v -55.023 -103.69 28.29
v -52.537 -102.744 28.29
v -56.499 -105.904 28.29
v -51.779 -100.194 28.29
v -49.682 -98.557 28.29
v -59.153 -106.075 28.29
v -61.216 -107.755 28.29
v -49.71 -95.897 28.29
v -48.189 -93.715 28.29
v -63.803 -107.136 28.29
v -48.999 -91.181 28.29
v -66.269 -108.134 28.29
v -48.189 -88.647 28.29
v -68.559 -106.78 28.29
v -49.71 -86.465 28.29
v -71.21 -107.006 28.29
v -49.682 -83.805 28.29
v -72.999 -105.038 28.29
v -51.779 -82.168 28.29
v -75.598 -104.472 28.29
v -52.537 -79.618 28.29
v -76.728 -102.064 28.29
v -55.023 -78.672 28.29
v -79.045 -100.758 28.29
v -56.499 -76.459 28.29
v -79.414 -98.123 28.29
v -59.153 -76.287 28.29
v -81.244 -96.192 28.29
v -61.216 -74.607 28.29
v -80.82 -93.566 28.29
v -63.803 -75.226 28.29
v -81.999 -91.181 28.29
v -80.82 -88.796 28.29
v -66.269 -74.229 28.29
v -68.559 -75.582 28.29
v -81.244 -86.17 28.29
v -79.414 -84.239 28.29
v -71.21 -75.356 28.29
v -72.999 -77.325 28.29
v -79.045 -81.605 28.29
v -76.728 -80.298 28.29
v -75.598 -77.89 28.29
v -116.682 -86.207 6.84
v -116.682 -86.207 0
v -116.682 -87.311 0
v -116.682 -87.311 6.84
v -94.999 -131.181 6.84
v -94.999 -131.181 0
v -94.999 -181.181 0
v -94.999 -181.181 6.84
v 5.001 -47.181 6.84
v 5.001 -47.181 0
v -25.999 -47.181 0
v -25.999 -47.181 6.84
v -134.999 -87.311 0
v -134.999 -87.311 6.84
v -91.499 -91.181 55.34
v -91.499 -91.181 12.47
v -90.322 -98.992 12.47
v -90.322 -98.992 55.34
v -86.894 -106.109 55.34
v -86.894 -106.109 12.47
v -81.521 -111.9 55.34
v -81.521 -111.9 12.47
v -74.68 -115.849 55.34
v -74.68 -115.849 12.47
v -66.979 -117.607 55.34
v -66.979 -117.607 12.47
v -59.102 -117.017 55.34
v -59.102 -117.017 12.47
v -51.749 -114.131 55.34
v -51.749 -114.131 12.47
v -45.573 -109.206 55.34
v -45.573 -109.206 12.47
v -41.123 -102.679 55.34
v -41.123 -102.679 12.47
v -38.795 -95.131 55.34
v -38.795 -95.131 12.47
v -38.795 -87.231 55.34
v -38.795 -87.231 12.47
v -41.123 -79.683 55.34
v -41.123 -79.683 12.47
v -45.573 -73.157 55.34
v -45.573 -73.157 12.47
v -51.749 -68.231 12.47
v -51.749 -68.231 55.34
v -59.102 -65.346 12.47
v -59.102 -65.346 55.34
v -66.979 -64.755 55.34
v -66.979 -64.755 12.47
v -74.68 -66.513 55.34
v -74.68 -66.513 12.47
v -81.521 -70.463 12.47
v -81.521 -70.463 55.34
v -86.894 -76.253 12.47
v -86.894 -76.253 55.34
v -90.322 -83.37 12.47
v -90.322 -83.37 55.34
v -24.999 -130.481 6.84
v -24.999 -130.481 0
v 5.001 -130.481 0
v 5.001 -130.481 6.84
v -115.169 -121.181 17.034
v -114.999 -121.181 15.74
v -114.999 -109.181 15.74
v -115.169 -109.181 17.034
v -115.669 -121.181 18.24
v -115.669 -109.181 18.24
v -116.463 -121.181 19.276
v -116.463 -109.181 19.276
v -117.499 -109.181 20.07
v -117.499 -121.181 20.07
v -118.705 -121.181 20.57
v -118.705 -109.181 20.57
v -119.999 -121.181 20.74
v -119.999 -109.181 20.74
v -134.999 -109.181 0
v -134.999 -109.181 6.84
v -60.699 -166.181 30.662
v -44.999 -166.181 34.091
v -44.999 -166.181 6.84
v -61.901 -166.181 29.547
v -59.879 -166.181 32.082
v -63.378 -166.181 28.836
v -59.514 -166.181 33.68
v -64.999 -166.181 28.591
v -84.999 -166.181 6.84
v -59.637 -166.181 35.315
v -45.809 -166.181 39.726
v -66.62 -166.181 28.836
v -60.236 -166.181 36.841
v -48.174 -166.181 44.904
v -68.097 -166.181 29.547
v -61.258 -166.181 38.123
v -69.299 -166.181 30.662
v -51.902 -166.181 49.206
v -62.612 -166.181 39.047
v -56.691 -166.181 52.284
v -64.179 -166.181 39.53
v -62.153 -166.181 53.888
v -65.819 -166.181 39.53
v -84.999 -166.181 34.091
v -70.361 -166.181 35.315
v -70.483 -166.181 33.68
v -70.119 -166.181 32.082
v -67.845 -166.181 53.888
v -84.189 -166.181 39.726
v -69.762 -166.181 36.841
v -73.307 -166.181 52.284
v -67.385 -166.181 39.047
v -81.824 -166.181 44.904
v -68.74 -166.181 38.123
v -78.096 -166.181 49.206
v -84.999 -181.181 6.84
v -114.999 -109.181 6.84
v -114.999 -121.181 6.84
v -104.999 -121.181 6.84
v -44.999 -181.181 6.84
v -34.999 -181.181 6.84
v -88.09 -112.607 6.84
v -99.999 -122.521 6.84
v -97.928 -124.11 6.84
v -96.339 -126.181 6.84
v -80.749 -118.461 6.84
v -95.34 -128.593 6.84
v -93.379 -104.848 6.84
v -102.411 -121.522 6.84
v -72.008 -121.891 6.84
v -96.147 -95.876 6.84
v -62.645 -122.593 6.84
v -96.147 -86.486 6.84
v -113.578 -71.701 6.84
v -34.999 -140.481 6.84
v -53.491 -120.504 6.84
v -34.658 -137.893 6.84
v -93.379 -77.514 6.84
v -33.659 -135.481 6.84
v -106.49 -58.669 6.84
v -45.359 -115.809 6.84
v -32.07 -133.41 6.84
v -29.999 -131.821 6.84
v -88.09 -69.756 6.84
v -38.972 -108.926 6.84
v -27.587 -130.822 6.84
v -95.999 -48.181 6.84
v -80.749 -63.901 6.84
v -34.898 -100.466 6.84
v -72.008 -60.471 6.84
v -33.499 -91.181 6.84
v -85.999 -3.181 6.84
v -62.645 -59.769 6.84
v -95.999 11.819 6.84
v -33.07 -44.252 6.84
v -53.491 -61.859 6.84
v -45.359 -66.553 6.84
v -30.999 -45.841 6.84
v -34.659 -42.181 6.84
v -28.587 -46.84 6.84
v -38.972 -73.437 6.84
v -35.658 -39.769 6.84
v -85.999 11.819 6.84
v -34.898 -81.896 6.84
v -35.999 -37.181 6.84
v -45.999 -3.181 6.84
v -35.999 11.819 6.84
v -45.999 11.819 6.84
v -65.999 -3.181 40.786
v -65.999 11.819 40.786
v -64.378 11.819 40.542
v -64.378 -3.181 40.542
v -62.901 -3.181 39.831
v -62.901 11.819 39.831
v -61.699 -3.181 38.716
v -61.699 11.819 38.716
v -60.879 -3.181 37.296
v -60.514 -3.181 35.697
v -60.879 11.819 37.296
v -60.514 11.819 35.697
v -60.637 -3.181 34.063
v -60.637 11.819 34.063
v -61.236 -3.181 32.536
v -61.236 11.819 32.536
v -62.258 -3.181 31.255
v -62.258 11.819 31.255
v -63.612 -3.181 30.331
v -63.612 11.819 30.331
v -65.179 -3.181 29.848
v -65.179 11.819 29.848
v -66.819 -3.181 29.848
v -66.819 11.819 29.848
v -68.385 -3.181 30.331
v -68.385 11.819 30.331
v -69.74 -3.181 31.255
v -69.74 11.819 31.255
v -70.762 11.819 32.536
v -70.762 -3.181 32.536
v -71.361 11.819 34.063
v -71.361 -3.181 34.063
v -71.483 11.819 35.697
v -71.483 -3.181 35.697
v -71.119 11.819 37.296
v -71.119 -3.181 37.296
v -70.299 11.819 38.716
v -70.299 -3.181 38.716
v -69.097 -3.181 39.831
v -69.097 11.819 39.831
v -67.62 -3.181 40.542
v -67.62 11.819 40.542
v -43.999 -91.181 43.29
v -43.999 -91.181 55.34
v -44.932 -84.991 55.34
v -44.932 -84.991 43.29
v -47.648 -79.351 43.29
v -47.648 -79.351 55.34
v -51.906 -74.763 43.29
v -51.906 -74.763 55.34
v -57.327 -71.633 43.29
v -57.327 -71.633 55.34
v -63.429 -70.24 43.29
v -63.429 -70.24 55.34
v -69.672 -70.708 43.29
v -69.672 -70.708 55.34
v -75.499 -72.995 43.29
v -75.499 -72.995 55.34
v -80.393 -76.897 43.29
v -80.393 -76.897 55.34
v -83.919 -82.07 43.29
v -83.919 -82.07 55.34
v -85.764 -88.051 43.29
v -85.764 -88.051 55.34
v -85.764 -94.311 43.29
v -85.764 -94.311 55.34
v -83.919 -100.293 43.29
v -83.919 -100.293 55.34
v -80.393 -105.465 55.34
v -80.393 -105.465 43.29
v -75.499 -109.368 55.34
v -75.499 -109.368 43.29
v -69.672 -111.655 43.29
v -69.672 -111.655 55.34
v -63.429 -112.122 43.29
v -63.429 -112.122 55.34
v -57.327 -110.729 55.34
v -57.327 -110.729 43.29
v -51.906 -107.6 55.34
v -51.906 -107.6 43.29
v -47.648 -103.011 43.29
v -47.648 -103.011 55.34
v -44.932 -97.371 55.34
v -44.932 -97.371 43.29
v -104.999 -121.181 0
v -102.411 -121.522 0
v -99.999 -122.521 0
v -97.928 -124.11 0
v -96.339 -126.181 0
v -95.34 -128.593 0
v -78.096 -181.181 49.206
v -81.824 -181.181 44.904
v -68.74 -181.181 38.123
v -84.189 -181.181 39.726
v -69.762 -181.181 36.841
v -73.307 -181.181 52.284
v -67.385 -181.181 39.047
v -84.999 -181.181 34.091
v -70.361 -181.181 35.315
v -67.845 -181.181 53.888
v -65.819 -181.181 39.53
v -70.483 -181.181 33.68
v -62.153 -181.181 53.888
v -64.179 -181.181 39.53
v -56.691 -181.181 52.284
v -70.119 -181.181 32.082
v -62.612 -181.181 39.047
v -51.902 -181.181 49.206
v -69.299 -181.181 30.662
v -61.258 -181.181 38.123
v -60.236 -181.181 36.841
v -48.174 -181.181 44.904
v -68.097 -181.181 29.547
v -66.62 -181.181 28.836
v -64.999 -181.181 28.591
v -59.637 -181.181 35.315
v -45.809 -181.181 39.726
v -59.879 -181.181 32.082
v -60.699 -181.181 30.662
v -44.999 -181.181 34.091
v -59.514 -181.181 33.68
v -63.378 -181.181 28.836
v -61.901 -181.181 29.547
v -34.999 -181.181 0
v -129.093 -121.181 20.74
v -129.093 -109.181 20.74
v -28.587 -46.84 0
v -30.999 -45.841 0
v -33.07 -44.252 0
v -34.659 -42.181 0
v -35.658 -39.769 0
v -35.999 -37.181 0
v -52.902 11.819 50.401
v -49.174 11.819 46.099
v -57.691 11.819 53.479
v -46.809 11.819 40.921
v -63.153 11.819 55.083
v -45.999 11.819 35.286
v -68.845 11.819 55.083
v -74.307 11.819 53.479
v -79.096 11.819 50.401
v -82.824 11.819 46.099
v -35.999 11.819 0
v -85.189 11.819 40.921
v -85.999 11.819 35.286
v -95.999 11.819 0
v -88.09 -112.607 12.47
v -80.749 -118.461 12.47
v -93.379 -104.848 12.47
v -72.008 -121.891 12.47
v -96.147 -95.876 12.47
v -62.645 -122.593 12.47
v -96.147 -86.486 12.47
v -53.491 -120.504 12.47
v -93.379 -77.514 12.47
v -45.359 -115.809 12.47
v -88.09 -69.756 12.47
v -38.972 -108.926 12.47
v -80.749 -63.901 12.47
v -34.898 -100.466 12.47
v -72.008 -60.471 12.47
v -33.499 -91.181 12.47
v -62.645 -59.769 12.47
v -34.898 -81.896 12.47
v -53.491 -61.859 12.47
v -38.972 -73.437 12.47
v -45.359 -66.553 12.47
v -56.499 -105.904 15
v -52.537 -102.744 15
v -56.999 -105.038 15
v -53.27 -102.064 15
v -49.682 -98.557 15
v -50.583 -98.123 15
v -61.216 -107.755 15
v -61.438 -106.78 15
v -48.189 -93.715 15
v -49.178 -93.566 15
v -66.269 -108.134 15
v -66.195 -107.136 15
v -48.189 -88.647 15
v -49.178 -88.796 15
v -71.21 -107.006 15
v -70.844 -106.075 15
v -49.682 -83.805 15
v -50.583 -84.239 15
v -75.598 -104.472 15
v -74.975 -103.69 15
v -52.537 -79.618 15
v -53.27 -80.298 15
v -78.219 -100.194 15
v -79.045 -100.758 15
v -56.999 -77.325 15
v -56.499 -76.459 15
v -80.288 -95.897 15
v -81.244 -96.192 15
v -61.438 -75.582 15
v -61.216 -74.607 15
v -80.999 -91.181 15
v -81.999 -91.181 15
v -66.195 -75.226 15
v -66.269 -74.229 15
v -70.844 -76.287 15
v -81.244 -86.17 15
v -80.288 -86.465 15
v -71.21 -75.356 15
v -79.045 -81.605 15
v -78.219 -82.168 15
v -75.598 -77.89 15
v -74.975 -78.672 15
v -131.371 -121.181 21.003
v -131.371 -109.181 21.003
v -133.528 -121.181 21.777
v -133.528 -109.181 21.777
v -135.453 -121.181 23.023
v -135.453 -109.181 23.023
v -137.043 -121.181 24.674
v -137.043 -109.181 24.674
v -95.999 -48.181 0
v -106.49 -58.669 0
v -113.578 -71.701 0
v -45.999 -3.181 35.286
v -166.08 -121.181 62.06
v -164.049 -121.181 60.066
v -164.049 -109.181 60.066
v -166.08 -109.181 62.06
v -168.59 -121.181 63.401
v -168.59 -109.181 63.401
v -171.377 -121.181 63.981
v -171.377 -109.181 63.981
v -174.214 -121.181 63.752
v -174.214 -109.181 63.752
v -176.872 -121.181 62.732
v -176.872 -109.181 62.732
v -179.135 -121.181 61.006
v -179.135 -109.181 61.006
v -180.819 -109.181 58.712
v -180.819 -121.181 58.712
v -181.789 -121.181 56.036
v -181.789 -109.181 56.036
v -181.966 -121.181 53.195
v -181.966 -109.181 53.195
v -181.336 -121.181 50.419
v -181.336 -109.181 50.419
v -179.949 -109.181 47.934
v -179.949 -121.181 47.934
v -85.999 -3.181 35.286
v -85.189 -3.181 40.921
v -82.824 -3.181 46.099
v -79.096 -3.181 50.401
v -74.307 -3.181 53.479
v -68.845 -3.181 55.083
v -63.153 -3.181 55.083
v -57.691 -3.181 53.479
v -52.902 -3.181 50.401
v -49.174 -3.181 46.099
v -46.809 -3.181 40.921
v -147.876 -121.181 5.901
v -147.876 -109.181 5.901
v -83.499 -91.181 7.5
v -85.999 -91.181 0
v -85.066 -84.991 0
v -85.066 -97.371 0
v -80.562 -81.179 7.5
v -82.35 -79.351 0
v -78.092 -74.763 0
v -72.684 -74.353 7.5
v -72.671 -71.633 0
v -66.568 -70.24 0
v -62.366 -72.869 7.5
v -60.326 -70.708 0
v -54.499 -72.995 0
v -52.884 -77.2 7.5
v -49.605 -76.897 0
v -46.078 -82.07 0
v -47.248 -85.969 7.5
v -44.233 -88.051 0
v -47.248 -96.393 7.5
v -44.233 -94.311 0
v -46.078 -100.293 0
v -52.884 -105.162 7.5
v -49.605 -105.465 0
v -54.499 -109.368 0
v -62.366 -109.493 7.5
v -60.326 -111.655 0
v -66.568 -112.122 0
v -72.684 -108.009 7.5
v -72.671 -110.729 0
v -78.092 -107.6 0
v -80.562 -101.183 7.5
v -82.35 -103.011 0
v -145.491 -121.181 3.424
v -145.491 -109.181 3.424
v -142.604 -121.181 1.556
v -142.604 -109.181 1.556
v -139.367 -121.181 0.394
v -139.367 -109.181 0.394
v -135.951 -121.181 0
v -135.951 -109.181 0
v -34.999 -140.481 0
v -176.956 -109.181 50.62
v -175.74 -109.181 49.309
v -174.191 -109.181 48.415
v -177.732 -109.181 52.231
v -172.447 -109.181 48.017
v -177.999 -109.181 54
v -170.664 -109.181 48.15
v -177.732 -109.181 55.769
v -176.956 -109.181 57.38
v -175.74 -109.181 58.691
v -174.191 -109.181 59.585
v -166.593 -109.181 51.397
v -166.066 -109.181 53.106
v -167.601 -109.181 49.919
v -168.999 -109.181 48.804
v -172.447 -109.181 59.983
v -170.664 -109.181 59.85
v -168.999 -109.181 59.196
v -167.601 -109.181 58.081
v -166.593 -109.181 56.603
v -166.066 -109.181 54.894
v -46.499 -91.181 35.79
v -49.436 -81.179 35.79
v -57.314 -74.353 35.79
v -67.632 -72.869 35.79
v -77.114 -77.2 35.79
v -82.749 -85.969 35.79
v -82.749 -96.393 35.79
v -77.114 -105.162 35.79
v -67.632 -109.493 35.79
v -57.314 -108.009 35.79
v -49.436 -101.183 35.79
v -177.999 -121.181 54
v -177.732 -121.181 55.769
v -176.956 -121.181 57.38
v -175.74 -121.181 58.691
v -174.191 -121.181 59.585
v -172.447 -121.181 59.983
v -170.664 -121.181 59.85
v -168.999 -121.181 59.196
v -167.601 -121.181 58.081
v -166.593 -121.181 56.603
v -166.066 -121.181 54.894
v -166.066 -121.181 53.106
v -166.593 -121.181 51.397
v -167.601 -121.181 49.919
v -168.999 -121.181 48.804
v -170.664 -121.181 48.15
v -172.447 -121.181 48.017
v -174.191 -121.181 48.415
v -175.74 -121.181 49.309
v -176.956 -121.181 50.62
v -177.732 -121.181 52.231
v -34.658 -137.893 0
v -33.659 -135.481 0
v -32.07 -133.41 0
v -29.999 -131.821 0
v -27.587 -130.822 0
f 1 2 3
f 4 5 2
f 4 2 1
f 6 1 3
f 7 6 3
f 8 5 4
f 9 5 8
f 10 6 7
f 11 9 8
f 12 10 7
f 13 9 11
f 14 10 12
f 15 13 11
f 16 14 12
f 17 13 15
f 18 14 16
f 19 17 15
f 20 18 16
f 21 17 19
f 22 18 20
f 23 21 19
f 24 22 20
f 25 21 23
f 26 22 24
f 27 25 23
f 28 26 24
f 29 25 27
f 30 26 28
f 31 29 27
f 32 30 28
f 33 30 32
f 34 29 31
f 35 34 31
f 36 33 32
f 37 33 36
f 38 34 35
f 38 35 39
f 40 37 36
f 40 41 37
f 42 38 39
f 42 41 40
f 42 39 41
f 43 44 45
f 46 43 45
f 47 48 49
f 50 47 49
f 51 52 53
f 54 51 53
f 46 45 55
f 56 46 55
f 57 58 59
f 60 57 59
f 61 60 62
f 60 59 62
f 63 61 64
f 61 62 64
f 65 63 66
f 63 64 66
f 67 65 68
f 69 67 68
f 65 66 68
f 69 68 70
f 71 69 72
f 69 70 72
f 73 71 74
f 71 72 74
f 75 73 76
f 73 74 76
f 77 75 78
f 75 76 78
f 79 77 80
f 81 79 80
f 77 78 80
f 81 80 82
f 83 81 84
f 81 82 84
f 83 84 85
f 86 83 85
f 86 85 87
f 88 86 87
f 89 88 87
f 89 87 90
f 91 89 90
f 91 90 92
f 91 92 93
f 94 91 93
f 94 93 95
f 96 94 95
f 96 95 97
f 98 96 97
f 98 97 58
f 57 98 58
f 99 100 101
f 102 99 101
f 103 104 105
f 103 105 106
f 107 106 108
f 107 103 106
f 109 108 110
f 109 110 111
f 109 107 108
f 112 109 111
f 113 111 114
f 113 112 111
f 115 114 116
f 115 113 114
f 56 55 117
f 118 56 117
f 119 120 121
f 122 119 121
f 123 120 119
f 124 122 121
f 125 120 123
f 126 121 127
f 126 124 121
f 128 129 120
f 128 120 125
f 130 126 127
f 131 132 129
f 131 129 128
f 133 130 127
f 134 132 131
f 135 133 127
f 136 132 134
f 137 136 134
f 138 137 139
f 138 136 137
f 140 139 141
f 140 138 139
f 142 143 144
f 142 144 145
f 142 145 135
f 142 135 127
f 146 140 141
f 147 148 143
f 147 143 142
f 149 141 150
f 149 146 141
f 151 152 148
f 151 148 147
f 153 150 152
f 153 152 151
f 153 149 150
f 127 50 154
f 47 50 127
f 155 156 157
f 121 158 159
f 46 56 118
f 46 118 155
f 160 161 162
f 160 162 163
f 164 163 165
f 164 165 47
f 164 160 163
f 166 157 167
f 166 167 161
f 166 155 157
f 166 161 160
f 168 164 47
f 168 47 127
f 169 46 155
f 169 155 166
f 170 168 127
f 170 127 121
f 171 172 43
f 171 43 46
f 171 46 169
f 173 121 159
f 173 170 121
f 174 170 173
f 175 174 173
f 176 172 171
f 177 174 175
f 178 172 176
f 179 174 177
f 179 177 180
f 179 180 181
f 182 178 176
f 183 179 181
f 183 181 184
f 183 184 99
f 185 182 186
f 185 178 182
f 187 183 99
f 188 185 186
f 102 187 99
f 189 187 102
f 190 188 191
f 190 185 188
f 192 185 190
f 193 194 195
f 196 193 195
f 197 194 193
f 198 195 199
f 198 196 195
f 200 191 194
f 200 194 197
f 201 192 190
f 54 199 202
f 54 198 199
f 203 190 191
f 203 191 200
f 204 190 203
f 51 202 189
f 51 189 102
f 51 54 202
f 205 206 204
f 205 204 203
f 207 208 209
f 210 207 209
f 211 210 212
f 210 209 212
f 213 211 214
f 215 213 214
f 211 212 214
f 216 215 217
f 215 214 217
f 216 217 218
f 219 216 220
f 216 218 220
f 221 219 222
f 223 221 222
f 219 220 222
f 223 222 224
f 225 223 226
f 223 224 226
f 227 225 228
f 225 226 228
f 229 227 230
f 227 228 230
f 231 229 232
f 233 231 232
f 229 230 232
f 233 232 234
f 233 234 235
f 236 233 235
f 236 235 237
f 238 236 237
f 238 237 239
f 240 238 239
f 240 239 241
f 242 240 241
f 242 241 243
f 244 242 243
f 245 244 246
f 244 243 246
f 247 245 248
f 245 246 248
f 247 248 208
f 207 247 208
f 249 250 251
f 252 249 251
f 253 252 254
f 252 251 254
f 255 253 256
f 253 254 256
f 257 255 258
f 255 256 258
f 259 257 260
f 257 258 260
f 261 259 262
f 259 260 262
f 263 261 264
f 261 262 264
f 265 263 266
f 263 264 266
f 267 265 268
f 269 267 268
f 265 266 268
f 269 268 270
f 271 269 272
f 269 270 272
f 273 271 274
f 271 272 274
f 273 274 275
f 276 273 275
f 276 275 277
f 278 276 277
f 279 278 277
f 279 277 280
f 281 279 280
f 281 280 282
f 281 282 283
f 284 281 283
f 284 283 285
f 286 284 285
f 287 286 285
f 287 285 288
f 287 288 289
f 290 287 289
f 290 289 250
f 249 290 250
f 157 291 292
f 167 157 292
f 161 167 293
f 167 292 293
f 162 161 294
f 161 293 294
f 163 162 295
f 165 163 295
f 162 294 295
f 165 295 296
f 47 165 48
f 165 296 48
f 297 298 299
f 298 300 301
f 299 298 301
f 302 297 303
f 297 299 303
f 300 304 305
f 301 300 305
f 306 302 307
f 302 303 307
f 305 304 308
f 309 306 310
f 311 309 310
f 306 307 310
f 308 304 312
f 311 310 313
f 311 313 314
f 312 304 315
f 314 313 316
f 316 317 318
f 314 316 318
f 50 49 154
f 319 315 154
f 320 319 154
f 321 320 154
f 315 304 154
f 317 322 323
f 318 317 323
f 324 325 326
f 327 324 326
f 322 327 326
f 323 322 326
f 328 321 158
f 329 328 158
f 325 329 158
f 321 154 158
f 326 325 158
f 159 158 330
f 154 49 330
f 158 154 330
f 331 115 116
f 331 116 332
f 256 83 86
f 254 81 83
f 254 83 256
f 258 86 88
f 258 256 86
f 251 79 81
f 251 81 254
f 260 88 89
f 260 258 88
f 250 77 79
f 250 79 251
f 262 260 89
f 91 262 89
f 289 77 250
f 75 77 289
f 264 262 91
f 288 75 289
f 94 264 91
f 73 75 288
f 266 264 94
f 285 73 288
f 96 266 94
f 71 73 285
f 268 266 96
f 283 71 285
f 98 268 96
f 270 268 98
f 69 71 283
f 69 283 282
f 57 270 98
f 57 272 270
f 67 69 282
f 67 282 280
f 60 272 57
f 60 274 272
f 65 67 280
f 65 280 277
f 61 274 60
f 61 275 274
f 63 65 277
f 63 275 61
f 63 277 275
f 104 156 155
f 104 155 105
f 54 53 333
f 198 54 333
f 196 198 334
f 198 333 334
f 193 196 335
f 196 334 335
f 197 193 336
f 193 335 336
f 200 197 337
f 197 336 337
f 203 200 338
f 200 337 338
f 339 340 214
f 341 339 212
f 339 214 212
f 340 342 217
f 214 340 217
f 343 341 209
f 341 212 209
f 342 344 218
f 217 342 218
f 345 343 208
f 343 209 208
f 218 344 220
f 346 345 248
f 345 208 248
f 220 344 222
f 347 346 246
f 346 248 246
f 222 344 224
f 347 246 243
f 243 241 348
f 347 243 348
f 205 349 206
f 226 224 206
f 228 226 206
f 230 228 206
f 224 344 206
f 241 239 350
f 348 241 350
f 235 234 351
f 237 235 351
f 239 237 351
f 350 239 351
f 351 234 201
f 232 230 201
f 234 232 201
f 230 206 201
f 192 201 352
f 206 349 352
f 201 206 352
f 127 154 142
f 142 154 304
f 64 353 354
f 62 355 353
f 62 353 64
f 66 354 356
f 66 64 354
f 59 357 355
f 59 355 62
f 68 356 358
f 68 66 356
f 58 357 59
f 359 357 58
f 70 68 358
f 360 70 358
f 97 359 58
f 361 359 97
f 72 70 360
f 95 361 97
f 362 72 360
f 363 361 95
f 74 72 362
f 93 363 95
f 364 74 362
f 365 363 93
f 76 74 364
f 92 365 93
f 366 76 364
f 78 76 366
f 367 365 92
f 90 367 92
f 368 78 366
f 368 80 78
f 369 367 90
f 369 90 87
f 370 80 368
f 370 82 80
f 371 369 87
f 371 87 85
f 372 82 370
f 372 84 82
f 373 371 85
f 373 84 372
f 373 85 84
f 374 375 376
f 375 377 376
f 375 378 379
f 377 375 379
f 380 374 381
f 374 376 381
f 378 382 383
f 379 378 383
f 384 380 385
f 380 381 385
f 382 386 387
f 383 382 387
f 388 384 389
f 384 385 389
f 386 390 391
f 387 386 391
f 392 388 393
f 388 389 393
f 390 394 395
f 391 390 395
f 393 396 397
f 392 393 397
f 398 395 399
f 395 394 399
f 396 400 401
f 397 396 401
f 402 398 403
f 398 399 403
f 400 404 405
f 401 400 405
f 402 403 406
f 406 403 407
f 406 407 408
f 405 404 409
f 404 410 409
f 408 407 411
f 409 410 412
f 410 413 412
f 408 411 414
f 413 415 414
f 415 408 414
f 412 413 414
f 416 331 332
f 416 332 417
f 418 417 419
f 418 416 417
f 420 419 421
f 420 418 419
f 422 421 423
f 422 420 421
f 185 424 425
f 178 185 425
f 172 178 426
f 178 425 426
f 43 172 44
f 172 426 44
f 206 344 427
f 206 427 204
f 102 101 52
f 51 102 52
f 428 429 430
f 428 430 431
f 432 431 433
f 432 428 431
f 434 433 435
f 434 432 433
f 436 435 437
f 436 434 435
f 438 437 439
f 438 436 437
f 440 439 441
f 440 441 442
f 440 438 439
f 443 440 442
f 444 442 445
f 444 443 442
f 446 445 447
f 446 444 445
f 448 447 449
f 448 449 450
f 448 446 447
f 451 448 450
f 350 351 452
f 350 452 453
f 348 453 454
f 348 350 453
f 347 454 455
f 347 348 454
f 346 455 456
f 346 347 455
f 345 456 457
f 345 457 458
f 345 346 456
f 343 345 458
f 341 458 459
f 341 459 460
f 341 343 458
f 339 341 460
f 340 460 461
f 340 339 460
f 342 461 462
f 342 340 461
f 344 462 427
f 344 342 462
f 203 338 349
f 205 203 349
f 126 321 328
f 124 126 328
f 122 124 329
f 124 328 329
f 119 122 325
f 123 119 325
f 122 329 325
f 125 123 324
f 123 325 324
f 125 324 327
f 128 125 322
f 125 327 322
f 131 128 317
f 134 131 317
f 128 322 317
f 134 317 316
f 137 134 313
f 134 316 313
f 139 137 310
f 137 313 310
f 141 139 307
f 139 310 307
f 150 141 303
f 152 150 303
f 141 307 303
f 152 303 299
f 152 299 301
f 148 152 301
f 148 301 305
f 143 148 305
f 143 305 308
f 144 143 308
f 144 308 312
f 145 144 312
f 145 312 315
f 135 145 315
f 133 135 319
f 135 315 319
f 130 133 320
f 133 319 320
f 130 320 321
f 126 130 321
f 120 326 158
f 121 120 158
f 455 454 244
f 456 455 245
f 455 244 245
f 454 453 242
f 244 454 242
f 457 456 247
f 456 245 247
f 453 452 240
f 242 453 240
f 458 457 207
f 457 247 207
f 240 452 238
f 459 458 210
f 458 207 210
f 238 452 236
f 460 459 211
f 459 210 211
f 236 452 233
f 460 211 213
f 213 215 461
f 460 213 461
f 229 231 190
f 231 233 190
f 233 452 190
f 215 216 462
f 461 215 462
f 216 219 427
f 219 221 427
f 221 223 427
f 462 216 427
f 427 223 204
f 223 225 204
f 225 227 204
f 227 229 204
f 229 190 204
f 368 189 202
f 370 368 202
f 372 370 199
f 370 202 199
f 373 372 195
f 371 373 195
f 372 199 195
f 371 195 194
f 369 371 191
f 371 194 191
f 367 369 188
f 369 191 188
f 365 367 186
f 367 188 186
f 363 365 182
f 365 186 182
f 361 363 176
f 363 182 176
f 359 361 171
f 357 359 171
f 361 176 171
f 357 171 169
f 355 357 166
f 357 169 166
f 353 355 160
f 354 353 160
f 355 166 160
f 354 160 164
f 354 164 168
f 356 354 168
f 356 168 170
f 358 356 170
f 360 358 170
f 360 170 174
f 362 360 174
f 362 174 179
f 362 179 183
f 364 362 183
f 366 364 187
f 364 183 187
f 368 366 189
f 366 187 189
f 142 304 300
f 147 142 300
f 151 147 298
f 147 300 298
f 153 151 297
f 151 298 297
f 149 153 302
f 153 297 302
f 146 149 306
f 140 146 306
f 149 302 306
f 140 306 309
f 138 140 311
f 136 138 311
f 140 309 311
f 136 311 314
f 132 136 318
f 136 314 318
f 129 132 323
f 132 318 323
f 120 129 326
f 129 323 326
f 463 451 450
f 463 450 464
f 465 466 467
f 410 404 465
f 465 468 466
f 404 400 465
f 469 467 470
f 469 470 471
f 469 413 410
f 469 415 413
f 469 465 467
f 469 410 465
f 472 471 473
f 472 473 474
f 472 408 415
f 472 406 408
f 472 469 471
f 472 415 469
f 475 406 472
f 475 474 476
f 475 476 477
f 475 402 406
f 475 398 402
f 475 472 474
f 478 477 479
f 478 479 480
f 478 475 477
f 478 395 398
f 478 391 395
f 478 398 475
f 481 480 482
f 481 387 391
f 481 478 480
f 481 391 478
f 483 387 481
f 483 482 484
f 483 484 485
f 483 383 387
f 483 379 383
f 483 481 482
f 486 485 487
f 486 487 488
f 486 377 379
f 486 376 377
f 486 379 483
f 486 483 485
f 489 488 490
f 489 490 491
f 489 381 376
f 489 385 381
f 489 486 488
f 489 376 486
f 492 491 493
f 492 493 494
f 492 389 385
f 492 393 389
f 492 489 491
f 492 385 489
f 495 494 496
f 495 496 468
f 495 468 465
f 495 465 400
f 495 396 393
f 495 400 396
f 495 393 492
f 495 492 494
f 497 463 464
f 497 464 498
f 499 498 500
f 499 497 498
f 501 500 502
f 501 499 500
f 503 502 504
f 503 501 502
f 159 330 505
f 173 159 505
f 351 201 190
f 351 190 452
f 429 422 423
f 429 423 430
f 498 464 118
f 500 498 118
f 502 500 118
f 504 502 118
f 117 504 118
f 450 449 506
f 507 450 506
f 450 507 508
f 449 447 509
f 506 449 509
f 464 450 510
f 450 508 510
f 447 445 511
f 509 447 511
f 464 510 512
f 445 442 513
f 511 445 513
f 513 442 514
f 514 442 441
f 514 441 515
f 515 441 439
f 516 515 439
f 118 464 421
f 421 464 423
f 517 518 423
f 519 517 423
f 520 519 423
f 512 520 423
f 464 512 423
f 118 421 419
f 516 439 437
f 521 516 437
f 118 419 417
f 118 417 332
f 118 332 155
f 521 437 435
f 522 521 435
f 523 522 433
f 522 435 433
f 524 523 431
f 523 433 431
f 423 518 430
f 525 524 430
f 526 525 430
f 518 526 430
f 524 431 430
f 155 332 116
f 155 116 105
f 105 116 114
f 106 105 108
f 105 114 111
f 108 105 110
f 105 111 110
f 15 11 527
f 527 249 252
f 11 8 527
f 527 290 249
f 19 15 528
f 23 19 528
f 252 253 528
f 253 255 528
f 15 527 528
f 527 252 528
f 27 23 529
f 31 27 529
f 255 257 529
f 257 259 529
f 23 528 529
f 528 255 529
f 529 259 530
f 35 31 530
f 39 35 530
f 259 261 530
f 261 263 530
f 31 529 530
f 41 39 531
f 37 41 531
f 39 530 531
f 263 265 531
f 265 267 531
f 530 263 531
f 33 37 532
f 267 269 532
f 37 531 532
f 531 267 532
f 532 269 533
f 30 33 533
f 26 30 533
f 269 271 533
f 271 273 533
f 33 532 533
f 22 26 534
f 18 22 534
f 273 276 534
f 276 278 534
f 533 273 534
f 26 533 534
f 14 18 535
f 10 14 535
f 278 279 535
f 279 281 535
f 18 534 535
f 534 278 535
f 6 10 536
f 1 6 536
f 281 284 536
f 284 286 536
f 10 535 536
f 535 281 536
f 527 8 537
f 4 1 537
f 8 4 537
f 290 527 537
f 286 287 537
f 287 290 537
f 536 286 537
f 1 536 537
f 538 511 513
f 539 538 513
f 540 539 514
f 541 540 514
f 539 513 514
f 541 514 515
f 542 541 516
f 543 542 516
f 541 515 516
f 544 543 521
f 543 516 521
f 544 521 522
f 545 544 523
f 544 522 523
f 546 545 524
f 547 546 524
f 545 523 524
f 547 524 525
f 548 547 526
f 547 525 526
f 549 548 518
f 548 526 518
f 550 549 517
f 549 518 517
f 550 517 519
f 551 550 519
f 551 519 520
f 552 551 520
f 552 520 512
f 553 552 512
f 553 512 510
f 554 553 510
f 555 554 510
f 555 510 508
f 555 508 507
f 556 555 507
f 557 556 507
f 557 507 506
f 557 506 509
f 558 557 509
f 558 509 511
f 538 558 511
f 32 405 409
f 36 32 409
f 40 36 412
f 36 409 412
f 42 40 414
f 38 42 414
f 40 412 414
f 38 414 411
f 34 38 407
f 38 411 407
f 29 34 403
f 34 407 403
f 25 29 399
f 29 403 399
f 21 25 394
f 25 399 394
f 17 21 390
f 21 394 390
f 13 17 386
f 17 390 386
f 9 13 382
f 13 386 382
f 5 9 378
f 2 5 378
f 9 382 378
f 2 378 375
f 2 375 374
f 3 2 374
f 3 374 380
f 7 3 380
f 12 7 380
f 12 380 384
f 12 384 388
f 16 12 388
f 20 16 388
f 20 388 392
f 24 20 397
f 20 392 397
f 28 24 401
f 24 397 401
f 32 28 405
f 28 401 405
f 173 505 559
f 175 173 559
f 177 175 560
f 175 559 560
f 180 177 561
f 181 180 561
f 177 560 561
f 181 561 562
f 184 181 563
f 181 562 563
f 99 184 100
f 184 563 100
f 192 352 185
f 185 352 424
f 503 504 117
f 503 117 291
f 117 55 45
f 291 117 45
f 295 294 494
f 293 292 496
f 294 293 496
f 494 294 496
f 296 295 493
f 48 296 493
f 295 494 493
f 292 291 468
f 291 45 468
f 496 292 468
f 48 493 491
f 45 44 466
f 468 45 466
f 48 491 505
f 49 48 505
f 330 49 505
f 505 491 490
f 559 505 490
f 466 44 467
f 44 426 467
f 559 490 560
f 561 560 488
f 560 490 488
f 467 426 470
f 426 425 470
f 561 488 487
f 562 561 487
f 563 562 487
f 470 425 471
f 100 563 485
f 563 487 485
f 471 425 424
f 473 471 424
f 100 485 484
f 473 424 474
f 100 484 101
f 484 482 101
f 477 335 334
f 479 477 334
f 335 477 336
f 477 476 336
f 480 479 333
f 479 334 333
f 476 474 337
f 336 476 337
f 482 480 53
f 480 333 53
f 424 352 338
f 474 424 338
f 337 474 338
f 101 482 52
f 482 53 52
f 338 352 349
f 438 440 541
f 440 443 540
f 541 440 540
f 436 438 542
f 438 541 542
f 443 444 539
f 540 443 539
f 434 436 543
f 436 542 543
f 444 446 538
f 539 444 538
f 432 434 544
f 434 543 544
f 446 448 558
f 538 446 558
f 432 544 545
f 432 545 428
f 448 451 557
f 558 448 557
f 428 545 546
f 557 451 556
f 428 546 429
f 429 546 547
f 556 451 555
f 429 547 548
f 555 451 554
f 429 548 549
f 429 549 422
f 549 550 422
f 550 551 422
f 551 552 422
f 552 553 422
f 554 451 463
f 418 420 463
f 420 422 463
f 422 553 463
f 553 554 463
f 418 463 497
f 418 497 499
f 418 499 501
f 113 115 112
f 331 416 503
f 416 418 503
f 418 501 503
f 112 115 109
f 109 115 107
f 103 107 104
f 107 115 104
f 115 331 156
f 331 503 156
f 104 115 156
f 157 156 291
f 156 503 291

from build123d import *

# Parameters (mm, degrees)
EXTRUDE_1_DEPTH     = 6.84
EXTRUDE_2_DEPTH     = 12
SKETCH_3_R          = 26.5
EXTRUDE_3_DEPTH     = 48.5
SKETCH_4_R          = 31.5
EXTRUDE_4_DEPTH     = 5.63
SKETCH_5_R          = 21
CUT_EXTRUDE_1_DEPTH = 9.13
SKETCH_6_R          = 21
CUT_EXTRUDE_2_DEPTH = 2.92
SKETCH_7_R          = 16
SKETCH_9_R          = 21
SKETCH_8_R          = 16
SKETCH_10_R         = 17
CUT_EXTRUDE_3_DEPTH = 13.29
SKETCH_11_R         = 6
CUT_EXTRUDE_4_DEPTH = 42.92
EXTRUDE_5_DEPTH     = 15
SKETCH_13_R         = 5.5
CUT_EXTRUDE_5_DEPTH = 15
EXTRUDE_6_DEPTH     = 15
SKETCH_16_R         = 5.5
CUT_EXTRUDE_6_DEPTH = 15


with BuildPart() as part:
    # 스케치1 → 보스-돌출1 (new body)
    with BuildSketch(Plane.XY):
        with BuildLine():
            Line((-34.998826986, -181.181097978), (-34.998826986, -140.481097978))
            ThreePointArc((-34.998826986, -140.481097978), (-32.069894798, -133.410030166), (-24.998826986, -130.481097978))
            Line((-24.998826986, -130.481097978), (5.001173014, -130.481097978))
            Line((5.001173014, -130.481097978), (5.001173014, -47.181097978))
            Line((5.001173014, -47.181097978), (-25.998826986, -47.181097978))
            ThreePointArc((-25.998826986, -47.181097978), (-33.069894798, -44.25216579), (-35.998826986, -37.181097978))
            Line((-35.998826986, -37.181097978), (-35.998826986, 11.818902022))
            Line((-35.998826986, 11.818902022), (-95.998826986, 11.818902022))
            Line((-95.998826986, 11.818902022), (-95.998826986, -48.181097978))
            ThreePointArc((-95.998826986, -48.181097978), (-110.502915378, -64.929776001), (-116.68226469, -86.206581157))
            Line((-116.68226469, -86.206581157), (-116.68226469, -87.311097978))
            Line((-116.68226469, -87.311097978), (-134.998826986, -87.311097978))
            Line((-134.998826986, -87.311097978), (-134.998826986, -121.181097978))
            Line((-134.998826986, -121.181097978), (-104.998826986, -121.181097978))
            ThreePointArc((-104.998826986, -121.181097978), (-97.927759174, -124.110030166), (-94.998826986, -131.181097978))
            Line((-94.998826986, -131.181097978), (-94.998826986, -181.181097978))
            Line((-94.998826986, -181.181097978), (-34.998826986, -181.181097978))
        make_face()
    extrude(amount=EXTRUDE_1_DEPTH)

    # 스케치2 → 보스-돌출2 (add)
    with BuildSketch(Plane.XZ.offset(121.181097978)):
        with BuildLine():
            Line((-114.998826986, 0), (-114.998826986, 15.74))
            ThreePointArc((-114.998826986, 15.74), (-116.46329308, 19.275533906), (-119.998826986, 20.74))
            Line((-119.998826986, 20.74), (-129.093412943, 20.74))
            ThreePointArc((-129.093412943, 20.74), (-133.528440233, 21.777269783), (-137.043403564, 24.673893413))
            Line((-137.043403564, 24.673893413), (-164.048836366, 60.066106587))
            ThreePointArc((-164.048836366, 60.066106587), (-178.064933574, 61.949990621), (-179.948817607, 47.933893413))
            Line((-179.948817607, 47.933893413), (-147.876203482, 5.900840119))
            ThreePointArc((-147.876203482, 5.900840119), (-142.603758486, 1.555904675), (-135.951217551, 0))
            Line((-135.951217551, 0), (-114.998826986, 0))
        make_face()
    extrude(amount=-EXTRUDE_2_DEPTH)

    # 스케치3 → 보스-돌출3 (add)
    with BuildSketch(Plane.XY.offset(6.84)):
        with Locations(Location((-64.998826986, -91.181097978, 0), (0, 0, 180))):
            Circle(SKETCH_3_R)
    extrude(amount=EXTRUDE_3_DEPTH)

    # 스케치4 → 보스-돌출4 (add)
    with BuildSketch(Plane.XY.offset(6.84)):
        with Locations((-64.998826986, -91.181097978)):
            Circle(SKETCH_4_R)
    extrude(amount=EXTRUDE_4_DEPTH)

    # 스케치5 → 컷-돌출1 (cut)
    with BuildSketch(Plane.XY.offset(55.34)):
        with Locations((-64.998826986, -91.181097978)):
            Circle(SKETCH_5_R)
    extrude(amount=-CUT_EXTRUDE_1_DEPTH, mode=Mode.SUBTRACT)

    # 스케치6 → 컷-돌출2 (cut)
    with BuildSketch(Plane.XY.offset(46.21)):
        with Locations((-64.998826986, -91.181097978)):
            Circle(SKETCH_6_R)
    extrude(amount=-CUT_EXTRUDE_2_DEPTH, mode=Mode.SUBTRACT)

    # 스케치7 → section 0 of loft_1
    with BuildSketch(Plane.XY.offset(28.29), mode=Mode.PRIVATE) as loft_1_s0:
        with Locations((-64.998826986, -91.181097978)):
            Circle(SKETCH_7_R)
    # loft up to a face of the part (loft_1)
    loft([loft_1_s0.sketch, Face(Wire([part.edges().sort_by_distance((-79.374316211, -75.872756802, 43.29))[0]]))], mode=Mode.SUBTRACT)

    # 스케치9 → 컷-로프트3 section 0
    with BuildSketch(Plane(origin=(0, 0, 0), x_dir=(-1, 0, 0), z_dir=(0, 0, -1))):
        with Locations((64.998826986, -91.181097978)):
            Circle(SKETCH_9_R)
    # 스케치8 → 컷-로프트3 section 1
    with BuildSketch(Plane(origin=(0, 0, 15), x_dir=(-1, 0, 0), z_dir=(0, 0, -1))):
        with Locations((64.998826986, -91.181097978)):
            Circle(SKETCH_8_R)
    loft(mode=Mode.SUBTRACT)

    # 스케치10 → 컷-돌출3 (cut)
    with BuildSketch(Plane(origin=(0, 0, 15), x_dir=(-1, 0, 0), z_dir=(0, 0, -1))):
        with Locations((64.998826986, -91.181097978)):
            Circle(SKETCH_10_R)
    extrude(amount=-CUT_EXTRUDE_3_DEPTH, mode=Mode.SUBTRACT)

    # 스케치11 → 컷-돌출4 (cut)
    with BuildSketch(Plane(origin=(0, -109.181097978, 0), x_dir=(1, 0, 0), z_dir=(0, 1, 0))):
        with Locations(Location((-171.998826986, -54, 0), (0, 0, 180))):
            Circle(SKETCH_11_R)
    extrude(amount=-CUT_EXTRUDE_4_DEPTH, mode=Mode.SUBTRACT)

    # 스케치12 → 보스-돌출5 (add)
    with BuildSketch(Plane.XZ.offset(181.181097978)):
        with BuildLine():
            Line((-84.998826986, 6.84), (-84.998826986, 34.091376239))
            ThreePointArc((-84.998826986, 34.091376239), (-64.998826986, 54.091376239), (-44.998826986, 34.091376239))
            Line((-44.998826986, 34.091376239), (-44.998826986, 6.84))
            Line((-44.998826986, 6.84), (-84.998826986, 6.84))
        make_face()
    extrude(amount=-EXTRUDE_5_DEPTH)

    # 스케치13 → 컷-돌출5 (cut)
    with BuildSketch(Plane.XZ.offset(181.181097978)):
        with Locations(Location((-64.998826986, 34.091376239, 0), (0, 0, 270))):
            Circle(SKETCH_13_R)
    extrude(amount=-CUT_EXTRUDE_5_DEPTH, mode=Mode.SUBTRACT)

    # 스케치15 → 보스-돌출6 (add)
    with BuildSketch(Plane(origin=(0, 11.818902022, 0), x_dir=(1, 0, 0), z_dir=(0, 1, 0))):
        with BuildLine():
            Line((-85.998826986, -6.84), (-85.998826986, -35.286448376))
            ThreePointArc((-85.998826986, -35.286448376), (-65.998826986, -55.286448376), (-45.998826986, -35.286448376))
            Line((-45.998826986, -35.286448376), (-45.998826986, -6.84))
            Line((-45.998826986, -6.84), (-85.998826986, -6.84))
        make_face()
    extrude(amount=-EXTRUDE_6_DEPTH)

    # 스케치16 → 컷-돌출6 (cut)
    with BuildSketch(Plane(origin=(0, 11.818902022, 0), x_dir=(1, 0, 0), z_dir=(0, 1, 0))):
        with Locations(Location((-65.998826986, -35.286448376, 0), (0, 0, 270))):
            Circle(SKETCH_16_R)
    extrude(amount=-CUT_EXTRUDE_6_DEPTH, mode=Mode.SUBTRACT)


solid = part.part
